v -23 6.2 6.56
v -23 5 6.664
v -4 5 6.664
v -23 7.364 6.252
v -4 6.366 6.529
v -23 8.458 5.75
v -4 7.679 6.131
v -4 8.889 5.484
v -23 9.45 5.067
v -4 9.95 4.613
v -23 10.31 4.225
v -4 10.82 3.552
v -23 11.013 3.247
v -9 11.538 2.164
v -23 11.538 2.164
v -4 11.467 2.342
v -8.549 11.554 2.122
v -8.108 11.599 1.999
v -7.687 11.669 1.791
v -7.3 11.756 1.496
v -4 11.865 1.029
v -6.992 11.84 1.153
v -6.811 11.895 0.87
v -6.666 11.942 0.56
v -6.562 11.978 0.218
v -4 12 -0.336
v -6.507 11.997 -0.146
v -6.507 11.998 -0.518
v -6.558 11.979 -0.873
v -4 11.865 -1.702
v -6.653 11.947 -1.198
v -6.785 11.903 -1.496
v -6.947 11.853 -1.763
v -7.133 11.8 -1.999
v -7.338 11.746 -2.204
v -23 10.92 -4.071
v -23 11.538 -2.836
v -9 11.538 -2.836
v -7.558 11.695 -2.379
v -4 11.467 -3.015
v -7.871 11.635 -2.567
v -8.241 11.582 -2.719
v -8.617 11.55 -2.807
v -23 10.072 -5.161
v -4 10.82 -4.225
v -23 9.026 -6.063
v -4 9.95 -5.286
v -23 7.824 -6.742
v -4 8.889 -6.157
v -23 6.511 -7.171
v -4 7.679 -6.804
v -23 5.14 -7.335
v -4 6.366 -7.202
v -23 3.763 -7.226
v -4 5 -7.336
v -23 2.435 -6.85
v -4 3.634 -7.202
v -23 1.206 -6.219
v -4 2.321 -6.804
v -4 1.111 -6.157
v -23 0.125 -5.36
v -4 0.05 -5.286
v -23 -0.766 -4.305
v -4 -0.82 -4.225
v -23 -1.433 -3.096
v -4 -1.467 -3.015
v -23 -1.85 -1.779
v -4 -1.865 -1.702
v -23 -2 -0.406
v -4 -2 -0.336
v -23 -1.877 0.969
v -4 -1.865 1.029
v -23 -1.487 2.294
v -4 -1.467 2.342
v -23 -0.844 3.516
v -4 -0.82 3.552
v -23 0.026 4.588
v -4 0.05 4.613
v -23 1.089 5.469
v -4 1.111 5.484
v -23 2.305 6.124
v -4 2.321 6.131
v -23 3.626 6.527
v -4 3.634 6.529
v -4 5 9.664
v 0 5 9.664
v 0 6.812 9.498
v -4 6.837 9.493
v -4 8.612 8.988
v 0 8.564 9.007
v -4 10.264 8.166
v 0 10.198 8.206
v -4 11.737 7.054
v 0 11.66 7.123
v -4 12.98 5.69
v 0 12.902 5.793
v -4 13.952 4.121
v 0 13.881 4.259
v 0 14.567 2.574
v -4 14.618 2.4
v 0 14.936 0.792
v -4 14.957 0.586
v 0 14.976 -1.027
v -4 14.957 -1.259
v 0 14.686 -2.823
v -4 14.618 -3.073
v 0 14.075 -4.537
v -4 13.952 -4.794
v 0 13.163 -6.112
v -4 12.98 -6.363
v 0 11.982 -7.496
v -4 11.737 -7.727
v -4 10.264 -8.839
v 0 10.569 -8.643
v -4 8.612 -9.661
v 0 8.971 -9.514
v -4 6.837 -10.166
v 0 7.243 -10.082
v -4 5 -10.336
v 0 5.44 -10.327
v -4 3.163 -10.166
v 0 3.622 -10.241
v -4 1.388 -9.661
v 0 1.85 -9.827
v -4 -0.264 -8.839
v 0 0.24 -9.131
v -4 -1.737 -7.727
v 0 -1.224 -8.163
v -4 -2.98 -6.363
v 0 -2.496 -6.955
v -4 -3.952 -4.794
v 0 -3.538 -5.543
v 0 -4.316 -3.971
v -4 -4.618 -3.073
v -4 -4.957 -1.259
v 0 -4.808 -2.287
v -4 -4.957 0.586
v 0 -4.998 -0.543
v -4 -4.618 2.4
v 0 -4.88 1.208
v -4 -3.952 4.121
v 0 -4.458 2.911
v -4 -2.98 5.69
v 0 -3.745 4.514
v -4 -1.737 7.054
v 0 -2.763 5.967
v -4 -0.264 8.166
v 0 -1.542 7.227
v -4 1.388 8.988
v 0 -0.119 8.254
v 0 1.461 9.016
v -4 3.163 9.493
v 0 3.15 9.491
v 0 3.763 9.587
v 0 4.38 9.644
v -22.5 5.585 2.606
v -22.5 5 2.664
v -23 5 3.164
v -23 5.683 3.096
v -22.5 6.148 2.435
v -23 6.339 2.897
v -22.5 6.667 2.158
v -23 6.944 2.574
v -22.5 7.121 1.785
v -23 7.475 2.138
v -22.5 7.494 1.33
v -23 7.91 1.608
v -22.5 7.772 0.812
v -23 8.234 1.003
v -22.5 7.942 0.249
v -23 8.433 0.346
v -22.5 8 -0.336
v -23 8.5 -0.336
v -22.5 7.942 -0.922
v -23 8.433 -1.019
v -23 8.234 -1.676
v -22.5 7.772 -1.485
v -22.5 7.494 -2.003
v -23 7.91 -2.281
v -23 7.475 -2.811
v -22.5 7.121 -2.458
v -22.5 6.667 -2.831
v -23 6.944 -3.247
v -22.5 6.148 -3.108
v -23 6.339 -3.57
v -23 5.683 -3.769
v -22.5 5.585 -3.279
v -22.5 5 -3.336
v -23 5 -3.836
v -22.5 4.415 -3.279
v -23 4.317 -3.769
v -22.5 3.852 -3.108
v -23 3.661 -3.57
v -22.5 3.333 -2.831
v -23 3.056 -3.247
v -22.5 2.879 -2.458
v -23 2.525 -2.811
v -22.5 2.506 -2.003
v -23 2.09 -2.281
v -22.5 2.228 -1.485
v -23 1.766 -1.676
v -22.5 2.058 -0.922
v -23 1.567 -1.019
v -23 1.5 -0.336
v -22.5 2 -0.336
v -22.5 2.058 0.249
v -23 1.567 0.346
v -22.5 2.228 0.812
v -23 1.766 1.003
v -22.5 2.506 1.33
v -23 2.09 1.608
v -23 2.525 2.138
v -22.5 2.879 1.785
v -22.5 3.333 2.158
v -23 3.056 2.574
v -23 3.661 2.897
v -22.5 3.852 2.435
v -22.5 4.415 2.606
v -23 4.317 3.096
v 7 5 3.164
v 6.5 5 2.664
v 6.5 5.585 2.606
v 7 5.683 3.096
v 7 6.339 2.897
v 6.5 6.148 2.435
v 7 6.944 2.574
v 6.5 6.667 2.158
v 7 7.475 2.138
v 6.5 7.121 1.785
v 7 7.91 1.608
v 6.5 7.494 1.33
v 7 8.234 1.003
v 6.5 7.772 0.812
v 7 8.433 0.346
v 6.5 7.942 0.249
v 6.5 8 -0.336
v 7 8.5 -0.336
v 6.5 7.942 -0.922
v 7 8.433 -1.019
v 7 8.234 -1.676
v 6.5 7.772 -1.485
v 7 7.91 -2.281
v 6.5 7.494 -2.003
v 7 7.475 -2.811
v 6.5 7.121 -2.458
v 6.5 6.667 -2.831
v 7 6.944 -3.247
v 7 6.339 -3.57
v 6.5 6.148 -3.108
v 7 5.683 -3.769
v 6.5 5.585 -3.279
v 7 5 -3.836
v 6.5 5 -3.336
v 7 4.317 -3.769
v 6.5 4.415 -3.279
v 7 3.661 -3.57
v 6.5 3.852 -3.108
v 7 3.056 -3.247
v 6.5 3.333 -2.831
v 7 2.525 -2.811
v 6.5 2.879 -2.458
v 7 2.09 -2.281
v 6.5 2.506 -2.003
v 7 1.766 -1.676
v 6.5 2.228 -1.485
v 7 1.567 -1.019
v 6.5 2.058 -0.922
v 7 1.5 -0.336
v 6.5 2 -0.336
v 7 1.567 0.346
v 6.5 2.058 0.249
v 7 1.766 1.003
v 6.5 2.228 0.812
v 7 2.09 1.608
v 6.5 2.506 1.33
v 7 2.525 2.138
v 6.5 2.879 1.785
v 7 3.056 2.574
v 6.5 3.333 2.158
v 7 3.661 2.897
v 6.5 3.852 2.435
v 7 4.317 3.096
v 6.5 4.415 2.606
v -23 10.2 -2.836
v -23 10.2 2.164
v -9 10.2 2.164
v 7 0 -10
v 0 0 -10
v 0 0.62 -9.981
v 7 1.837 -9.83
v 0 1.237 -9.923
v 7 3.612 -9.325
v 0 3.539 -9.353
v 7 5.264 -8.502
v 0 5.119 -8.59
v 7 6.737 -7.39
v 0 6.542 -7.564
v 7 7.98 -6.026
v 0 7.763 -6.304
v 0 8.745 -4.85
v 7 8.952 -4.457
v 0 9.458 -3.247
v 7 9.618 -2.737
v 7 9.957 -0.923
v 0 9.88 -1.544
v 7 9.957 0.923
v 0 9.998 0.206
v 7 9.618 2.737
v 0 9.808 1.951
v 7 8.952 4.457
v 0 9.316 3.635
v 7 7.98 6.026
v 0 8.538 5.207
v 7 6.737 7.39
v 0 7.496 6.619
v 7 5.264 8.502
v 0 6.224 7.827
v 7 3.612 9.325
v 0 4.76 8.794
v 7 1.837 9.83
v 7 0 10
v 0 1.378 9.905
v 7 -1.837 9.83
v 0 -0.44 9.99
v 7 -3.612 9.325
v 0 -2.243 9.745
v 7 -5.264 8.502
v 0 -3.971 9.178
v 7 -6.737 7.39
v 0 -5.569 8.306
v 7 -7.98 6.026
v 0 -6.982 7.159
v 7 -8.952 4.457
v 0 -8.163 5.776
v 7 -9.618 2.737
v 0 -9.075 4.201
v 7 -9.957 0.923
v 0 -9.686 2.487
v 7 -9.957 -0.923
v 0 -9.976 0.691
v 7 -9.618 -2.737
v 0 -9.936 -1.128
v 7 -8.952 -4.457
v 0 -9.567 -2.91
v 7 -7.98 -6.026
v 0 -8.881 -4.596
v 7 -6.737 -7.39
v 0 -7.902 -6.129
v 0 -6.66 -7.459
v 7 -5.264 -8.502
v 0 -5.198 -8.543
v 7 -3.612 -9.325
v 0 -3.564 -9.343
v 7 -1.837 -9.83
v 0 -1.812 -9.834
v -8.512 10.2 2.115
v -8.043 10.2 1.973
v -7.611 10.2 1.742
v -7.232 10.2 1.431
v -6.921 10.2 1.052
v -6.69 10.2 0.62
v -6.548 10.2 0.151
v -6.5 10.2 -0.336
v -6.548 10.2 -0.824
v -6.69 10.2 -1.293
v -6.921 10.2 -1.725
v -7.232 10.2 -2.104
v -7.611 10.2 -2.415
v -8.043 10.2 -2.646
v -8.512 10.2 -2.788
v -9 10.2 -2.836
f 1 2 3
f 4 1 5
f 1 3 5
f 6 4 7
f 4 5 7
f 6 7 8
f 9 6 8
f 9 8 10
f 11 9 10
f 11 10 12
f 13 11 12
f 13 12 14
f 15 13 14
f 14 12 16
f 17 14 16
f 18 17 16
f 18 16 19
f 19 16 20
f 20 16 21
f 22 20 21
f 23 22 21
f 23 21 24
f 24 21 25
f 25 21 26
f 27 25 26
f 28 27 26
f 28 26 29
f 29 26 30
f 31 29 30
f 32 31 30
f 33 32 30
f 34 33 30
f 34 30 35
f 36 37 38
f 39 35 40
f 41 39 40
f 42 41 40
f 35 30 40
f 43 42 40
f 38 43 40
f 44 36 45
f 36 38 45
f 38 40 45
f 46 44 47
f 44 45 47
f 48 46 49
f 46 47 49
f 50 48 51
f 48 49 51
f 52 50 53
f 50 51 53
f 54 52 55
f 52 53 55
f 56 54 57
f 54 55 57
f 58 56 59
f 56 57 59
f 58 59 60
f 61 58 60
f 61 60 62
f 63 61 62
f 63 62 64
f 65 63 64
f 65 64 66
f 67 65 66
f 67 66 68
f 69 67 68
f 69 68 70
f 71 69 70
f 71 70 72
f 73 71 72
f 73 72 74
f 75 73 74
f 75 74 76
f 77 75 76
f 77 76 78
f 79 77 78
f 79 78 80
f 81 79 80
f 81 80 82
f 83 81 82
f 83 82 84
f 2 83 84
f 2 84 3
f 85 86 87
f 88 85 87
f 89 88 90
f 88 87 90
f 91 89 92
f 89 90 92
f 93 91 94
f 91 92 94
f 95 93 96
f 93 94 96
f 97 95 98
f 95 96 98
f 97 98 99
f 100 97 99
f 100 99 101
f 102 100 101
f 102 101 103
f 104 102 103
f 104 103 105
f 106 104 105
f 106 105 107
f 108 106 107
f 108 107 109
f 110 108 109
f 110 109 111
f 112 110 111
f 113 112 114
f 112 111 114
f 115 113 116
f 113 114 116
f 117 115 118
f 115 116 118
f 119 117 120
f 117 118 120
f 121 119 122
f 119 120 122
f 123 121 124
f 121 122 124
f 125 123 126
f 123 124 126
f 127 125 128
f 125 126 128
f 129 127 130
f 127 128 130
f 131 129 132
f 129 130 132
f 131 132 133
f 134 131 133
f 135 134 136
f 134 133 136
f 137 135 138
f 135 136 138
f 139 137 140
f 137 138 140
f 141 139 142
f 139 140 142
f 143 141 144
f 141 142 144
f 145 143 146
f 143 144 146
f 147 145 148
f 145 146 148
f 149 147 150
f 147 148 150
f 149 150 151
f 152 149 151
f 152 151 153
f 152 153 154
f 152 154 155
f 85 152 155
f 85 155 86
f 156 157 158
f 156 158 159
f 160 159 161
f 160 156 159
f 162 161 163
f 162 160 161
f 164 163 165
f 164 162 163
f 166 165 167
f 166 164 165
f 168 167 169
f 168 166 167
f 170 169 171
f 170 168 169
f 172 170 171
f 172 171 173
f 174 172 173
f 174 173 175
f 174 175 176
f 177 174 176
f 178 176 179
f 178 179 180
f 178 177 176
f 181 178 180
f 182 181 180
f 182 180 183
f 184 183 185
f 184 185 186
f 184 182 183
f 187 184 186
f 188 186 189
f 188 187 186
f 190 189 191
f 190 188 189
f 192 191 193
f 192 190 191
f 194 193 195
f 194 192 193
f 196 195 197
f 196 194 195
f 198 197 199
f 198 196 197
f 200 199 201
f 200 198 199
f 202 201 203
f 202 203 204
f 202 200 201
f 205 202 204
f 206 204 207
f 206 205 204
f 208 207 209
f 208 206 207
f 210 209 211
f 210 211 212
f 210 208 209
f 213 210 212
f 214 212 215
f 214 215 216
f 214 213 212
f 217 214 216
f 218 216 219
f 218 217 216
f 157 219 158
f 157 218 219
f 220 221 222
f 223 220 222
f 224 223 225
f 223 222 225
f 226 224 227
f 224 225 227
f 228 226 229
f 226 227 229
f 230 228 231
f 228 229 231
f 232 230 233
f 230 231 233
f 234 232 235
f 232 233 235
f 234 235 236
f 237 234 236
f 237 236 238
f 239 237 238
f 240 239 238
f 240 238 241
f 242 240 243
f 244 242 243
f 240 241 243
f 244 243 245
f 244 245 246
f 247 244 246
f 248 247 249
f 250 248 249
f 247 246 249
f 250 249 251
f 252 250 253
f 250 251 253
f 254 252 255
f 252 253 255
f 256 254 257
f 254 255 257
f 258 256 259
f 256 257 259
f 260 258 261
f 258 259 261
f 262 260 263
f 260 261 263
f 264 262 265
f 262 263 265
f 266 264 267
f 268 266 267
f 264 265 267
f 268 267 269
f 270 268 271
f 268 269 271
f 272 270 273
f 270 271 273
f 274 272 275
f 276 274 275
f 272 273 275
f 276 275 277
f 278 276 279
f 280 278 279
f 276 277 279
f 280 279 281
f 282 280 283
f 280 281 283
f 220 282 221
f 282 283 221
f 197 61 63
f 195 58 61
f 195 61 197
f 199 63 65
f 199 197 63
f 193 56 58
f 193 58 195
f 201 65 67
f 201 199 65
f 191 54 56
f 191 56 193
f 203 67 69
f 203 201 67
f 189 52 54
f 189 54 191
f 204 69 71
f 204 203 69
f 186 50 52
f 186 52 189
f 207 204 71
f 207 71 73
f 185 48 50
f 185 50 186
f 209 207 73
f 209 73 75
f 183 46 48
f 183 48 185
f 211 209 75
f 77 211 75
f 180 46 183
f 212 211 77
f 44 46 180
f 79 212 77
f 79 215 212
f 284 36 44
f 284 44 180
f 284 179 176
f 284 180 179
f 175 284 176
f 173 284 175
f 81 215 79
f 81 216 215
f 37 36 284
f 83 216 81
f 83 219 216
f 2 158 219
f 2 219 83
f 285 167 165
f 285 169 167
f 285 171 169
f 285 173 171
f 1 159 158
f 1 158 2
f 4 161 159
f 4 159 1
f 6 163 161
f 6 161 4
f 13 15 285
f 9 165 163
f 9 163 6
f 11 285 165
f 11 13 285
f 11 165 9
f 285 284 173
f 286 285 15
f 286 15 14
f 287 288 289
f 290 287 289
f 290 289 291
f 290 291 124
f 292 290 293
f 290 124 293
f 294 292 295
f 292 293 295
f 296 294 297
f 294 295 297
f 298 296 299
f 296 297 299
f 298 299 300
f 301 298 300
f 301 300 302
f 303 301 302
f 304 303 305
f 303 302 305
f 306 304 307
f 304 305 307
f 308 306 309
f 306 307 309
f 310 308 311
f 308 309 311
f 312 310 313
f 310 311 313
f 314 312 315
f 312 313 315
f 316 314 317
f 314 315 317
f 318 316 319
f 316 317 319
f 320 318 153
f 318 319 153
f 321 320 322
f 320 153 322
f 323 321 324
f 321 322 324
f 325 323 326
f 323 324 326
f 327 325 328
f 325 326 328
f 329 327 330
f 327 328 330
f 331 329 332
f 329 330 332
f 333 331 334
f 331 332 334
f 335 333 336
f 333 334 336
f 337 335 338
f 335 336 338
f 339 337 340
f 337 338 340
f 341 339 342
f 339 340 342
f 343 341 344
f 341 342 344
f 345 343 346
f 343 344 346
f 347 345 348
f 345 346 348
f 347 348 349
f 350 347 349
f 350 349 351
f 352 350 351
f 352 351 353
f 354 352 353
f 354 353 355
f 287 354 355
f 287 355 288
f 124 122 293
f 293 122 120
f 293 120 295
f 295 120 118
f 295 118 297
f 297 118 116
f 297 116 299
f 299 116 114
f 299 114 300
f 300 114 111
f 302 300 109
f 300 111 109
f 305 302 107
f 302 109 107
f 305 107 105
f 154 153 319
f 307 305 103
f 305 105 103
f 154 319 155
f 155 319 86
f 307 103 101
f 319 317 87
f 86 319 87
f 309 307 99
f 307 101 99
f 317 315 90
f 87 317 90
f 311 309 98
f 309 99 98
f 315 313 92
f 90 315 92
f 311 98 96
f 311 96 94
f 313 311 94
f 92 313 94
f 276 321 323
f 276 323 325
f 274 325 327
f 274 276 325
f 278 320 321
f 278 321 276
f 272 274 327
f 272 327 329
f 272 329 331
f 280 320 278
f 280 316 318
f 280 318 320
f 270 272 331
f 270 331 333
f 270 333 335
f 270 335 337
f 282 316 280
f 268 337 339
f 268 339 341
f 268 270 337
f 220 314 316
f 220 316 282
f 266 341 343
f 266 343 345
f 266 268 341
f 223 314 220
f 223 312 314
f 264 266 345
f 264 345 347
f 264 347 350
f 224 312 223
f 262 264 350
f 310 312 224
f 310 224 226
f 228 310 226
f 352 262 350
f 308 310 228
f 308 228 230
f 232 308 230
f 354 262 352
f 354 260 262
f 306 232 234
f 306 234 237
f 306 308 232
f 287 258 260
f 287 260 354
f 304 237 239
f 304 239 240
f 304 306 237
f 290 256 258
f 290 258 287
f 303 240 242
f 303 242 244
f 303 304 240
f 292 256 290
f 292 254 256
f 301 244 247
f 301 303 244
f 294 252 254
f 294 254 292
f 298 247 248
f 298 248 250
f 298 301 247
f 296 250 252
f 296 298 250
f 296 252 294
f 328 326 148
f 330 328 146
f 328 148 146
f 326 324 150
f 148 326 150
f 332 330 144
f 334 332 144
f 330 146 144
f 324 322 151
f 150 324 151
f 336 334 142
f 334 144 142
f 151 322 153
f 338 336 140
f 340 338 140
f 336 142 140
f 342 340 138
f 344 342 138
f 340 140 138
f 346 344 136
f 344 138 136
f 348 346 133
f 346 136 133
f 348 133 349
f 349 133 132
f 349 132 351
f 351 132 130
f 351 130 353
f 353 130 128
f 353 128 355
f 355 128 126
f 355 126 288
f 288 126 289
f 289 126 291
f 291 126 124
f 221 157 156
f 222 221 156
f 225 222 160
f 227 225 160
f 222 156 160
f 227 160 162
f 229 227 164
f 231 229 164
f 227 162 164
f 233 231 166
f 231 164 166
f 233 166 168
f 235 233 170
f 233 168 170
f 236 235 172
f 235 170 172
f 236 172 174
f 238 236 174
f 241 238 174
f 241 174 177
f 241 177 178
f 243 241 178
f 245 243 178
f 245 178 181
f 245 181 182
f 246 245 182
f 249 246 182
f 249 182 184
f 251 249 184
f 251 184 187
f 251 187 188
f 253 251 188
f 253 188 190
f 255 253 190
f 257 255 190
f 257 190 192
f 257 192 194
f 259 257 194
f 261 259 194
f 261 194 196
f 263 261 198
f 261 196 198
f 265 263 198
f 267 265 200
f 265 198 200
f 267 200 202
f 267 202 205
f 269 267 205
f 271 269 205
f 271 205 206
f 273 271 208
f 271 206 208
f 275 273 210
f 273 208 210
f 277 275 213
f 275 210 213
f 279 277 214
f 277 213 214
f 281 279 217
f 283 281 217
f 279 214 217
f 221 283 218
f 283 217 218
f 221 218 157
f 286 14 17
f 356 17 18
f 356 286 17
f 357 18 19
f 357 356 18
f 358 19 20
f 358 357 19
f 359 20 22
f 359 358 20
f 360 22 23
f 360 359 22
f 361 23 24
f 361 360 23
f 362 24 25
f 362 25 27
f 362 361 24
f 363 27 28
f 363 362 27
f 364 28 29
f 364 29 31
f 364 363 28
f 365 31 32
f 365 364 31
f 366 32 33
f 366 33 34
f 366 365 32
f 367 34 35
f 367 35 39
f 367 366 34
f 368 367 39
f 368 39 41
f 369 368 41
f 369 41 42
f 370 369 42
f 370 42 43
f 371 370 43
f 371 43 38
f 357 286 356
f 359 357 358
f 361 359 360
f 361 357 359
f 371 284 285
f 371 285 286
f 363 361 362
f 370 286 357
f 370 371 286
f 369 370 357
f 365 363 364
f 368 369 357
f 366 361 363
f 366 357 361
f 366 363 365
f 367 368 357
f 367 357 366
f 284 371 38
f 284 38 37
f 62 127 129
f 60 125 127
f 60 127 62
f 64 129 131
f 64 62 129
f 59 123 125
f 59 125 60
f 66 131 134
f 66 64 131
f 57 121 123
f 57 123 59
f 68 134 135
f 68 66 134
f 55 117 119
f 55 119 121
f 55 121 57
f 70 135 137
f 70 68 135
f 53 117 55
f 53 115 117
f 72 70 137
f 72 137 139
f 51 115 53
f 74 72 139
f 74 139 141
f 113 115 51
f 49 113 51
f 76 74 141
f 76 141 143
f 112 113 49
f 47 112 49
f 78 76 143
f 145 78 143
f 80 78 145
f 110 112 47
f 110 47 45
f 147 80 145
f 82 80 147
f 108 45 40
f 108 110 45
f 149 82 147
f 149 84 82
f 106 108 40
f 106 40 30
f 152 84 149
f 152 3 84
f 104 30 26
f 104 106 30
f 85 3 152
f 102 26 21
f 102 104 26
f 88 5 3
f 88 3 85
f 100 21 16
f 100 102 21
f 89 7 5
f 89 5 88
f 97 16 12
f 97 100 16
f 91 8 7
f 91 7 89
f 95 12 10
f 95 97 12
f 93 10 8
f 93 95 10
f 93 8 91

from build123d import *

# Parameters (mm, degrees)
SKETCH1_R           = 10
BOSS_EXTRUDE1_DEPTH = 7
SKETCH2_R           = 10
BOSS_EXTRUDE2_DEPTH = 4
SKETCH3_R           = 7
BOSS_EXTRUDE3_DEPTH = 19
SKETCH4_R           = 3
CUT_EXTRUDE1_DEPTH  = 31
CHAMFER1_SIZE       = 0.5
CUT_EXTRUDE2_START  = 10.2
CUT_EXTRUDE2_DEPTH  = 5.8


with BuildPart() as part:
    # Sketch1 → Boss-Extrude1 (new body)
    with BuildSketch(Plane(origin=(0, 0, 0), x_dir=(0, 0, -1), z_dir=(1, 0, 0))):
        Circle(SKETCH1_R)
    extrude(amount=BOSS_EXTRUDE1_DEPTH)

    # Sketch2 → Boss-Extrude2 (add)
    with BuildSketch(Plane.ZY):
        with Locations((-0.336496213, 5)):
            Circle(SKETCH2_R)
    extrude(amount=BOSS_EXTRUDE2_DEPTH)

    # Sketch3 → Boss-Extrude3 (add)
    with BuildSketch(Plane.ZY.offset(4)):
        with Locations((-0.336496213, 5)):
            Circle(SKETCH3_R)
    extrude(amount=BOSS_EXTRUDE3_DEPTH)

    # Sketch4 → Cut-Extrude1 (cut, through all)
    with BuildSketch(Plane.ZY.offset(23)):
        with Locations((-0.336496213, 5)):
            Circle(SKETCH4_R)
    extrude(amount=-CUT_EXTRUDE1_DEPTH, mode=Mode.SUBTRACT)

    # Chamfer1
    chamfer1_edges = [part.edges().sort_by_distance(p)[0] for p in [
        (7, 5, -3.336496213),
        (-23, 5, -3.336496213),
    ]]
    chamfer(chamfer1_edges, length=CHAMFER1_SIZE)

    # Sketch5 → Cut-Extrude2 (cut, through all)
    with BuildSketch(Plane(origin=(0, 0, 0), x_dir=(1, 0, 0), z_dir=(0, 1, 0)).offset(CUT_EXTRUDE2_START)):
        with BuildLine():
            Line((-9, 2.836496213), (-26.986787276, 2.836496213))
            Line((-26.986787276, 2.836496213), (-26.986787276, -2.163503787))
            Line((-26.986787276, -2.163503787), (-9, -2.163503787))
            ThreePointArc((-9, -2.163503787), (-6.5, 0.336496213), (-9, 2.836496213))
        make_face()
    extrude(amount=CUT_EXTRUDE2_DEPTH, mode=Mode.SUBTRACT)


solid = part.part
